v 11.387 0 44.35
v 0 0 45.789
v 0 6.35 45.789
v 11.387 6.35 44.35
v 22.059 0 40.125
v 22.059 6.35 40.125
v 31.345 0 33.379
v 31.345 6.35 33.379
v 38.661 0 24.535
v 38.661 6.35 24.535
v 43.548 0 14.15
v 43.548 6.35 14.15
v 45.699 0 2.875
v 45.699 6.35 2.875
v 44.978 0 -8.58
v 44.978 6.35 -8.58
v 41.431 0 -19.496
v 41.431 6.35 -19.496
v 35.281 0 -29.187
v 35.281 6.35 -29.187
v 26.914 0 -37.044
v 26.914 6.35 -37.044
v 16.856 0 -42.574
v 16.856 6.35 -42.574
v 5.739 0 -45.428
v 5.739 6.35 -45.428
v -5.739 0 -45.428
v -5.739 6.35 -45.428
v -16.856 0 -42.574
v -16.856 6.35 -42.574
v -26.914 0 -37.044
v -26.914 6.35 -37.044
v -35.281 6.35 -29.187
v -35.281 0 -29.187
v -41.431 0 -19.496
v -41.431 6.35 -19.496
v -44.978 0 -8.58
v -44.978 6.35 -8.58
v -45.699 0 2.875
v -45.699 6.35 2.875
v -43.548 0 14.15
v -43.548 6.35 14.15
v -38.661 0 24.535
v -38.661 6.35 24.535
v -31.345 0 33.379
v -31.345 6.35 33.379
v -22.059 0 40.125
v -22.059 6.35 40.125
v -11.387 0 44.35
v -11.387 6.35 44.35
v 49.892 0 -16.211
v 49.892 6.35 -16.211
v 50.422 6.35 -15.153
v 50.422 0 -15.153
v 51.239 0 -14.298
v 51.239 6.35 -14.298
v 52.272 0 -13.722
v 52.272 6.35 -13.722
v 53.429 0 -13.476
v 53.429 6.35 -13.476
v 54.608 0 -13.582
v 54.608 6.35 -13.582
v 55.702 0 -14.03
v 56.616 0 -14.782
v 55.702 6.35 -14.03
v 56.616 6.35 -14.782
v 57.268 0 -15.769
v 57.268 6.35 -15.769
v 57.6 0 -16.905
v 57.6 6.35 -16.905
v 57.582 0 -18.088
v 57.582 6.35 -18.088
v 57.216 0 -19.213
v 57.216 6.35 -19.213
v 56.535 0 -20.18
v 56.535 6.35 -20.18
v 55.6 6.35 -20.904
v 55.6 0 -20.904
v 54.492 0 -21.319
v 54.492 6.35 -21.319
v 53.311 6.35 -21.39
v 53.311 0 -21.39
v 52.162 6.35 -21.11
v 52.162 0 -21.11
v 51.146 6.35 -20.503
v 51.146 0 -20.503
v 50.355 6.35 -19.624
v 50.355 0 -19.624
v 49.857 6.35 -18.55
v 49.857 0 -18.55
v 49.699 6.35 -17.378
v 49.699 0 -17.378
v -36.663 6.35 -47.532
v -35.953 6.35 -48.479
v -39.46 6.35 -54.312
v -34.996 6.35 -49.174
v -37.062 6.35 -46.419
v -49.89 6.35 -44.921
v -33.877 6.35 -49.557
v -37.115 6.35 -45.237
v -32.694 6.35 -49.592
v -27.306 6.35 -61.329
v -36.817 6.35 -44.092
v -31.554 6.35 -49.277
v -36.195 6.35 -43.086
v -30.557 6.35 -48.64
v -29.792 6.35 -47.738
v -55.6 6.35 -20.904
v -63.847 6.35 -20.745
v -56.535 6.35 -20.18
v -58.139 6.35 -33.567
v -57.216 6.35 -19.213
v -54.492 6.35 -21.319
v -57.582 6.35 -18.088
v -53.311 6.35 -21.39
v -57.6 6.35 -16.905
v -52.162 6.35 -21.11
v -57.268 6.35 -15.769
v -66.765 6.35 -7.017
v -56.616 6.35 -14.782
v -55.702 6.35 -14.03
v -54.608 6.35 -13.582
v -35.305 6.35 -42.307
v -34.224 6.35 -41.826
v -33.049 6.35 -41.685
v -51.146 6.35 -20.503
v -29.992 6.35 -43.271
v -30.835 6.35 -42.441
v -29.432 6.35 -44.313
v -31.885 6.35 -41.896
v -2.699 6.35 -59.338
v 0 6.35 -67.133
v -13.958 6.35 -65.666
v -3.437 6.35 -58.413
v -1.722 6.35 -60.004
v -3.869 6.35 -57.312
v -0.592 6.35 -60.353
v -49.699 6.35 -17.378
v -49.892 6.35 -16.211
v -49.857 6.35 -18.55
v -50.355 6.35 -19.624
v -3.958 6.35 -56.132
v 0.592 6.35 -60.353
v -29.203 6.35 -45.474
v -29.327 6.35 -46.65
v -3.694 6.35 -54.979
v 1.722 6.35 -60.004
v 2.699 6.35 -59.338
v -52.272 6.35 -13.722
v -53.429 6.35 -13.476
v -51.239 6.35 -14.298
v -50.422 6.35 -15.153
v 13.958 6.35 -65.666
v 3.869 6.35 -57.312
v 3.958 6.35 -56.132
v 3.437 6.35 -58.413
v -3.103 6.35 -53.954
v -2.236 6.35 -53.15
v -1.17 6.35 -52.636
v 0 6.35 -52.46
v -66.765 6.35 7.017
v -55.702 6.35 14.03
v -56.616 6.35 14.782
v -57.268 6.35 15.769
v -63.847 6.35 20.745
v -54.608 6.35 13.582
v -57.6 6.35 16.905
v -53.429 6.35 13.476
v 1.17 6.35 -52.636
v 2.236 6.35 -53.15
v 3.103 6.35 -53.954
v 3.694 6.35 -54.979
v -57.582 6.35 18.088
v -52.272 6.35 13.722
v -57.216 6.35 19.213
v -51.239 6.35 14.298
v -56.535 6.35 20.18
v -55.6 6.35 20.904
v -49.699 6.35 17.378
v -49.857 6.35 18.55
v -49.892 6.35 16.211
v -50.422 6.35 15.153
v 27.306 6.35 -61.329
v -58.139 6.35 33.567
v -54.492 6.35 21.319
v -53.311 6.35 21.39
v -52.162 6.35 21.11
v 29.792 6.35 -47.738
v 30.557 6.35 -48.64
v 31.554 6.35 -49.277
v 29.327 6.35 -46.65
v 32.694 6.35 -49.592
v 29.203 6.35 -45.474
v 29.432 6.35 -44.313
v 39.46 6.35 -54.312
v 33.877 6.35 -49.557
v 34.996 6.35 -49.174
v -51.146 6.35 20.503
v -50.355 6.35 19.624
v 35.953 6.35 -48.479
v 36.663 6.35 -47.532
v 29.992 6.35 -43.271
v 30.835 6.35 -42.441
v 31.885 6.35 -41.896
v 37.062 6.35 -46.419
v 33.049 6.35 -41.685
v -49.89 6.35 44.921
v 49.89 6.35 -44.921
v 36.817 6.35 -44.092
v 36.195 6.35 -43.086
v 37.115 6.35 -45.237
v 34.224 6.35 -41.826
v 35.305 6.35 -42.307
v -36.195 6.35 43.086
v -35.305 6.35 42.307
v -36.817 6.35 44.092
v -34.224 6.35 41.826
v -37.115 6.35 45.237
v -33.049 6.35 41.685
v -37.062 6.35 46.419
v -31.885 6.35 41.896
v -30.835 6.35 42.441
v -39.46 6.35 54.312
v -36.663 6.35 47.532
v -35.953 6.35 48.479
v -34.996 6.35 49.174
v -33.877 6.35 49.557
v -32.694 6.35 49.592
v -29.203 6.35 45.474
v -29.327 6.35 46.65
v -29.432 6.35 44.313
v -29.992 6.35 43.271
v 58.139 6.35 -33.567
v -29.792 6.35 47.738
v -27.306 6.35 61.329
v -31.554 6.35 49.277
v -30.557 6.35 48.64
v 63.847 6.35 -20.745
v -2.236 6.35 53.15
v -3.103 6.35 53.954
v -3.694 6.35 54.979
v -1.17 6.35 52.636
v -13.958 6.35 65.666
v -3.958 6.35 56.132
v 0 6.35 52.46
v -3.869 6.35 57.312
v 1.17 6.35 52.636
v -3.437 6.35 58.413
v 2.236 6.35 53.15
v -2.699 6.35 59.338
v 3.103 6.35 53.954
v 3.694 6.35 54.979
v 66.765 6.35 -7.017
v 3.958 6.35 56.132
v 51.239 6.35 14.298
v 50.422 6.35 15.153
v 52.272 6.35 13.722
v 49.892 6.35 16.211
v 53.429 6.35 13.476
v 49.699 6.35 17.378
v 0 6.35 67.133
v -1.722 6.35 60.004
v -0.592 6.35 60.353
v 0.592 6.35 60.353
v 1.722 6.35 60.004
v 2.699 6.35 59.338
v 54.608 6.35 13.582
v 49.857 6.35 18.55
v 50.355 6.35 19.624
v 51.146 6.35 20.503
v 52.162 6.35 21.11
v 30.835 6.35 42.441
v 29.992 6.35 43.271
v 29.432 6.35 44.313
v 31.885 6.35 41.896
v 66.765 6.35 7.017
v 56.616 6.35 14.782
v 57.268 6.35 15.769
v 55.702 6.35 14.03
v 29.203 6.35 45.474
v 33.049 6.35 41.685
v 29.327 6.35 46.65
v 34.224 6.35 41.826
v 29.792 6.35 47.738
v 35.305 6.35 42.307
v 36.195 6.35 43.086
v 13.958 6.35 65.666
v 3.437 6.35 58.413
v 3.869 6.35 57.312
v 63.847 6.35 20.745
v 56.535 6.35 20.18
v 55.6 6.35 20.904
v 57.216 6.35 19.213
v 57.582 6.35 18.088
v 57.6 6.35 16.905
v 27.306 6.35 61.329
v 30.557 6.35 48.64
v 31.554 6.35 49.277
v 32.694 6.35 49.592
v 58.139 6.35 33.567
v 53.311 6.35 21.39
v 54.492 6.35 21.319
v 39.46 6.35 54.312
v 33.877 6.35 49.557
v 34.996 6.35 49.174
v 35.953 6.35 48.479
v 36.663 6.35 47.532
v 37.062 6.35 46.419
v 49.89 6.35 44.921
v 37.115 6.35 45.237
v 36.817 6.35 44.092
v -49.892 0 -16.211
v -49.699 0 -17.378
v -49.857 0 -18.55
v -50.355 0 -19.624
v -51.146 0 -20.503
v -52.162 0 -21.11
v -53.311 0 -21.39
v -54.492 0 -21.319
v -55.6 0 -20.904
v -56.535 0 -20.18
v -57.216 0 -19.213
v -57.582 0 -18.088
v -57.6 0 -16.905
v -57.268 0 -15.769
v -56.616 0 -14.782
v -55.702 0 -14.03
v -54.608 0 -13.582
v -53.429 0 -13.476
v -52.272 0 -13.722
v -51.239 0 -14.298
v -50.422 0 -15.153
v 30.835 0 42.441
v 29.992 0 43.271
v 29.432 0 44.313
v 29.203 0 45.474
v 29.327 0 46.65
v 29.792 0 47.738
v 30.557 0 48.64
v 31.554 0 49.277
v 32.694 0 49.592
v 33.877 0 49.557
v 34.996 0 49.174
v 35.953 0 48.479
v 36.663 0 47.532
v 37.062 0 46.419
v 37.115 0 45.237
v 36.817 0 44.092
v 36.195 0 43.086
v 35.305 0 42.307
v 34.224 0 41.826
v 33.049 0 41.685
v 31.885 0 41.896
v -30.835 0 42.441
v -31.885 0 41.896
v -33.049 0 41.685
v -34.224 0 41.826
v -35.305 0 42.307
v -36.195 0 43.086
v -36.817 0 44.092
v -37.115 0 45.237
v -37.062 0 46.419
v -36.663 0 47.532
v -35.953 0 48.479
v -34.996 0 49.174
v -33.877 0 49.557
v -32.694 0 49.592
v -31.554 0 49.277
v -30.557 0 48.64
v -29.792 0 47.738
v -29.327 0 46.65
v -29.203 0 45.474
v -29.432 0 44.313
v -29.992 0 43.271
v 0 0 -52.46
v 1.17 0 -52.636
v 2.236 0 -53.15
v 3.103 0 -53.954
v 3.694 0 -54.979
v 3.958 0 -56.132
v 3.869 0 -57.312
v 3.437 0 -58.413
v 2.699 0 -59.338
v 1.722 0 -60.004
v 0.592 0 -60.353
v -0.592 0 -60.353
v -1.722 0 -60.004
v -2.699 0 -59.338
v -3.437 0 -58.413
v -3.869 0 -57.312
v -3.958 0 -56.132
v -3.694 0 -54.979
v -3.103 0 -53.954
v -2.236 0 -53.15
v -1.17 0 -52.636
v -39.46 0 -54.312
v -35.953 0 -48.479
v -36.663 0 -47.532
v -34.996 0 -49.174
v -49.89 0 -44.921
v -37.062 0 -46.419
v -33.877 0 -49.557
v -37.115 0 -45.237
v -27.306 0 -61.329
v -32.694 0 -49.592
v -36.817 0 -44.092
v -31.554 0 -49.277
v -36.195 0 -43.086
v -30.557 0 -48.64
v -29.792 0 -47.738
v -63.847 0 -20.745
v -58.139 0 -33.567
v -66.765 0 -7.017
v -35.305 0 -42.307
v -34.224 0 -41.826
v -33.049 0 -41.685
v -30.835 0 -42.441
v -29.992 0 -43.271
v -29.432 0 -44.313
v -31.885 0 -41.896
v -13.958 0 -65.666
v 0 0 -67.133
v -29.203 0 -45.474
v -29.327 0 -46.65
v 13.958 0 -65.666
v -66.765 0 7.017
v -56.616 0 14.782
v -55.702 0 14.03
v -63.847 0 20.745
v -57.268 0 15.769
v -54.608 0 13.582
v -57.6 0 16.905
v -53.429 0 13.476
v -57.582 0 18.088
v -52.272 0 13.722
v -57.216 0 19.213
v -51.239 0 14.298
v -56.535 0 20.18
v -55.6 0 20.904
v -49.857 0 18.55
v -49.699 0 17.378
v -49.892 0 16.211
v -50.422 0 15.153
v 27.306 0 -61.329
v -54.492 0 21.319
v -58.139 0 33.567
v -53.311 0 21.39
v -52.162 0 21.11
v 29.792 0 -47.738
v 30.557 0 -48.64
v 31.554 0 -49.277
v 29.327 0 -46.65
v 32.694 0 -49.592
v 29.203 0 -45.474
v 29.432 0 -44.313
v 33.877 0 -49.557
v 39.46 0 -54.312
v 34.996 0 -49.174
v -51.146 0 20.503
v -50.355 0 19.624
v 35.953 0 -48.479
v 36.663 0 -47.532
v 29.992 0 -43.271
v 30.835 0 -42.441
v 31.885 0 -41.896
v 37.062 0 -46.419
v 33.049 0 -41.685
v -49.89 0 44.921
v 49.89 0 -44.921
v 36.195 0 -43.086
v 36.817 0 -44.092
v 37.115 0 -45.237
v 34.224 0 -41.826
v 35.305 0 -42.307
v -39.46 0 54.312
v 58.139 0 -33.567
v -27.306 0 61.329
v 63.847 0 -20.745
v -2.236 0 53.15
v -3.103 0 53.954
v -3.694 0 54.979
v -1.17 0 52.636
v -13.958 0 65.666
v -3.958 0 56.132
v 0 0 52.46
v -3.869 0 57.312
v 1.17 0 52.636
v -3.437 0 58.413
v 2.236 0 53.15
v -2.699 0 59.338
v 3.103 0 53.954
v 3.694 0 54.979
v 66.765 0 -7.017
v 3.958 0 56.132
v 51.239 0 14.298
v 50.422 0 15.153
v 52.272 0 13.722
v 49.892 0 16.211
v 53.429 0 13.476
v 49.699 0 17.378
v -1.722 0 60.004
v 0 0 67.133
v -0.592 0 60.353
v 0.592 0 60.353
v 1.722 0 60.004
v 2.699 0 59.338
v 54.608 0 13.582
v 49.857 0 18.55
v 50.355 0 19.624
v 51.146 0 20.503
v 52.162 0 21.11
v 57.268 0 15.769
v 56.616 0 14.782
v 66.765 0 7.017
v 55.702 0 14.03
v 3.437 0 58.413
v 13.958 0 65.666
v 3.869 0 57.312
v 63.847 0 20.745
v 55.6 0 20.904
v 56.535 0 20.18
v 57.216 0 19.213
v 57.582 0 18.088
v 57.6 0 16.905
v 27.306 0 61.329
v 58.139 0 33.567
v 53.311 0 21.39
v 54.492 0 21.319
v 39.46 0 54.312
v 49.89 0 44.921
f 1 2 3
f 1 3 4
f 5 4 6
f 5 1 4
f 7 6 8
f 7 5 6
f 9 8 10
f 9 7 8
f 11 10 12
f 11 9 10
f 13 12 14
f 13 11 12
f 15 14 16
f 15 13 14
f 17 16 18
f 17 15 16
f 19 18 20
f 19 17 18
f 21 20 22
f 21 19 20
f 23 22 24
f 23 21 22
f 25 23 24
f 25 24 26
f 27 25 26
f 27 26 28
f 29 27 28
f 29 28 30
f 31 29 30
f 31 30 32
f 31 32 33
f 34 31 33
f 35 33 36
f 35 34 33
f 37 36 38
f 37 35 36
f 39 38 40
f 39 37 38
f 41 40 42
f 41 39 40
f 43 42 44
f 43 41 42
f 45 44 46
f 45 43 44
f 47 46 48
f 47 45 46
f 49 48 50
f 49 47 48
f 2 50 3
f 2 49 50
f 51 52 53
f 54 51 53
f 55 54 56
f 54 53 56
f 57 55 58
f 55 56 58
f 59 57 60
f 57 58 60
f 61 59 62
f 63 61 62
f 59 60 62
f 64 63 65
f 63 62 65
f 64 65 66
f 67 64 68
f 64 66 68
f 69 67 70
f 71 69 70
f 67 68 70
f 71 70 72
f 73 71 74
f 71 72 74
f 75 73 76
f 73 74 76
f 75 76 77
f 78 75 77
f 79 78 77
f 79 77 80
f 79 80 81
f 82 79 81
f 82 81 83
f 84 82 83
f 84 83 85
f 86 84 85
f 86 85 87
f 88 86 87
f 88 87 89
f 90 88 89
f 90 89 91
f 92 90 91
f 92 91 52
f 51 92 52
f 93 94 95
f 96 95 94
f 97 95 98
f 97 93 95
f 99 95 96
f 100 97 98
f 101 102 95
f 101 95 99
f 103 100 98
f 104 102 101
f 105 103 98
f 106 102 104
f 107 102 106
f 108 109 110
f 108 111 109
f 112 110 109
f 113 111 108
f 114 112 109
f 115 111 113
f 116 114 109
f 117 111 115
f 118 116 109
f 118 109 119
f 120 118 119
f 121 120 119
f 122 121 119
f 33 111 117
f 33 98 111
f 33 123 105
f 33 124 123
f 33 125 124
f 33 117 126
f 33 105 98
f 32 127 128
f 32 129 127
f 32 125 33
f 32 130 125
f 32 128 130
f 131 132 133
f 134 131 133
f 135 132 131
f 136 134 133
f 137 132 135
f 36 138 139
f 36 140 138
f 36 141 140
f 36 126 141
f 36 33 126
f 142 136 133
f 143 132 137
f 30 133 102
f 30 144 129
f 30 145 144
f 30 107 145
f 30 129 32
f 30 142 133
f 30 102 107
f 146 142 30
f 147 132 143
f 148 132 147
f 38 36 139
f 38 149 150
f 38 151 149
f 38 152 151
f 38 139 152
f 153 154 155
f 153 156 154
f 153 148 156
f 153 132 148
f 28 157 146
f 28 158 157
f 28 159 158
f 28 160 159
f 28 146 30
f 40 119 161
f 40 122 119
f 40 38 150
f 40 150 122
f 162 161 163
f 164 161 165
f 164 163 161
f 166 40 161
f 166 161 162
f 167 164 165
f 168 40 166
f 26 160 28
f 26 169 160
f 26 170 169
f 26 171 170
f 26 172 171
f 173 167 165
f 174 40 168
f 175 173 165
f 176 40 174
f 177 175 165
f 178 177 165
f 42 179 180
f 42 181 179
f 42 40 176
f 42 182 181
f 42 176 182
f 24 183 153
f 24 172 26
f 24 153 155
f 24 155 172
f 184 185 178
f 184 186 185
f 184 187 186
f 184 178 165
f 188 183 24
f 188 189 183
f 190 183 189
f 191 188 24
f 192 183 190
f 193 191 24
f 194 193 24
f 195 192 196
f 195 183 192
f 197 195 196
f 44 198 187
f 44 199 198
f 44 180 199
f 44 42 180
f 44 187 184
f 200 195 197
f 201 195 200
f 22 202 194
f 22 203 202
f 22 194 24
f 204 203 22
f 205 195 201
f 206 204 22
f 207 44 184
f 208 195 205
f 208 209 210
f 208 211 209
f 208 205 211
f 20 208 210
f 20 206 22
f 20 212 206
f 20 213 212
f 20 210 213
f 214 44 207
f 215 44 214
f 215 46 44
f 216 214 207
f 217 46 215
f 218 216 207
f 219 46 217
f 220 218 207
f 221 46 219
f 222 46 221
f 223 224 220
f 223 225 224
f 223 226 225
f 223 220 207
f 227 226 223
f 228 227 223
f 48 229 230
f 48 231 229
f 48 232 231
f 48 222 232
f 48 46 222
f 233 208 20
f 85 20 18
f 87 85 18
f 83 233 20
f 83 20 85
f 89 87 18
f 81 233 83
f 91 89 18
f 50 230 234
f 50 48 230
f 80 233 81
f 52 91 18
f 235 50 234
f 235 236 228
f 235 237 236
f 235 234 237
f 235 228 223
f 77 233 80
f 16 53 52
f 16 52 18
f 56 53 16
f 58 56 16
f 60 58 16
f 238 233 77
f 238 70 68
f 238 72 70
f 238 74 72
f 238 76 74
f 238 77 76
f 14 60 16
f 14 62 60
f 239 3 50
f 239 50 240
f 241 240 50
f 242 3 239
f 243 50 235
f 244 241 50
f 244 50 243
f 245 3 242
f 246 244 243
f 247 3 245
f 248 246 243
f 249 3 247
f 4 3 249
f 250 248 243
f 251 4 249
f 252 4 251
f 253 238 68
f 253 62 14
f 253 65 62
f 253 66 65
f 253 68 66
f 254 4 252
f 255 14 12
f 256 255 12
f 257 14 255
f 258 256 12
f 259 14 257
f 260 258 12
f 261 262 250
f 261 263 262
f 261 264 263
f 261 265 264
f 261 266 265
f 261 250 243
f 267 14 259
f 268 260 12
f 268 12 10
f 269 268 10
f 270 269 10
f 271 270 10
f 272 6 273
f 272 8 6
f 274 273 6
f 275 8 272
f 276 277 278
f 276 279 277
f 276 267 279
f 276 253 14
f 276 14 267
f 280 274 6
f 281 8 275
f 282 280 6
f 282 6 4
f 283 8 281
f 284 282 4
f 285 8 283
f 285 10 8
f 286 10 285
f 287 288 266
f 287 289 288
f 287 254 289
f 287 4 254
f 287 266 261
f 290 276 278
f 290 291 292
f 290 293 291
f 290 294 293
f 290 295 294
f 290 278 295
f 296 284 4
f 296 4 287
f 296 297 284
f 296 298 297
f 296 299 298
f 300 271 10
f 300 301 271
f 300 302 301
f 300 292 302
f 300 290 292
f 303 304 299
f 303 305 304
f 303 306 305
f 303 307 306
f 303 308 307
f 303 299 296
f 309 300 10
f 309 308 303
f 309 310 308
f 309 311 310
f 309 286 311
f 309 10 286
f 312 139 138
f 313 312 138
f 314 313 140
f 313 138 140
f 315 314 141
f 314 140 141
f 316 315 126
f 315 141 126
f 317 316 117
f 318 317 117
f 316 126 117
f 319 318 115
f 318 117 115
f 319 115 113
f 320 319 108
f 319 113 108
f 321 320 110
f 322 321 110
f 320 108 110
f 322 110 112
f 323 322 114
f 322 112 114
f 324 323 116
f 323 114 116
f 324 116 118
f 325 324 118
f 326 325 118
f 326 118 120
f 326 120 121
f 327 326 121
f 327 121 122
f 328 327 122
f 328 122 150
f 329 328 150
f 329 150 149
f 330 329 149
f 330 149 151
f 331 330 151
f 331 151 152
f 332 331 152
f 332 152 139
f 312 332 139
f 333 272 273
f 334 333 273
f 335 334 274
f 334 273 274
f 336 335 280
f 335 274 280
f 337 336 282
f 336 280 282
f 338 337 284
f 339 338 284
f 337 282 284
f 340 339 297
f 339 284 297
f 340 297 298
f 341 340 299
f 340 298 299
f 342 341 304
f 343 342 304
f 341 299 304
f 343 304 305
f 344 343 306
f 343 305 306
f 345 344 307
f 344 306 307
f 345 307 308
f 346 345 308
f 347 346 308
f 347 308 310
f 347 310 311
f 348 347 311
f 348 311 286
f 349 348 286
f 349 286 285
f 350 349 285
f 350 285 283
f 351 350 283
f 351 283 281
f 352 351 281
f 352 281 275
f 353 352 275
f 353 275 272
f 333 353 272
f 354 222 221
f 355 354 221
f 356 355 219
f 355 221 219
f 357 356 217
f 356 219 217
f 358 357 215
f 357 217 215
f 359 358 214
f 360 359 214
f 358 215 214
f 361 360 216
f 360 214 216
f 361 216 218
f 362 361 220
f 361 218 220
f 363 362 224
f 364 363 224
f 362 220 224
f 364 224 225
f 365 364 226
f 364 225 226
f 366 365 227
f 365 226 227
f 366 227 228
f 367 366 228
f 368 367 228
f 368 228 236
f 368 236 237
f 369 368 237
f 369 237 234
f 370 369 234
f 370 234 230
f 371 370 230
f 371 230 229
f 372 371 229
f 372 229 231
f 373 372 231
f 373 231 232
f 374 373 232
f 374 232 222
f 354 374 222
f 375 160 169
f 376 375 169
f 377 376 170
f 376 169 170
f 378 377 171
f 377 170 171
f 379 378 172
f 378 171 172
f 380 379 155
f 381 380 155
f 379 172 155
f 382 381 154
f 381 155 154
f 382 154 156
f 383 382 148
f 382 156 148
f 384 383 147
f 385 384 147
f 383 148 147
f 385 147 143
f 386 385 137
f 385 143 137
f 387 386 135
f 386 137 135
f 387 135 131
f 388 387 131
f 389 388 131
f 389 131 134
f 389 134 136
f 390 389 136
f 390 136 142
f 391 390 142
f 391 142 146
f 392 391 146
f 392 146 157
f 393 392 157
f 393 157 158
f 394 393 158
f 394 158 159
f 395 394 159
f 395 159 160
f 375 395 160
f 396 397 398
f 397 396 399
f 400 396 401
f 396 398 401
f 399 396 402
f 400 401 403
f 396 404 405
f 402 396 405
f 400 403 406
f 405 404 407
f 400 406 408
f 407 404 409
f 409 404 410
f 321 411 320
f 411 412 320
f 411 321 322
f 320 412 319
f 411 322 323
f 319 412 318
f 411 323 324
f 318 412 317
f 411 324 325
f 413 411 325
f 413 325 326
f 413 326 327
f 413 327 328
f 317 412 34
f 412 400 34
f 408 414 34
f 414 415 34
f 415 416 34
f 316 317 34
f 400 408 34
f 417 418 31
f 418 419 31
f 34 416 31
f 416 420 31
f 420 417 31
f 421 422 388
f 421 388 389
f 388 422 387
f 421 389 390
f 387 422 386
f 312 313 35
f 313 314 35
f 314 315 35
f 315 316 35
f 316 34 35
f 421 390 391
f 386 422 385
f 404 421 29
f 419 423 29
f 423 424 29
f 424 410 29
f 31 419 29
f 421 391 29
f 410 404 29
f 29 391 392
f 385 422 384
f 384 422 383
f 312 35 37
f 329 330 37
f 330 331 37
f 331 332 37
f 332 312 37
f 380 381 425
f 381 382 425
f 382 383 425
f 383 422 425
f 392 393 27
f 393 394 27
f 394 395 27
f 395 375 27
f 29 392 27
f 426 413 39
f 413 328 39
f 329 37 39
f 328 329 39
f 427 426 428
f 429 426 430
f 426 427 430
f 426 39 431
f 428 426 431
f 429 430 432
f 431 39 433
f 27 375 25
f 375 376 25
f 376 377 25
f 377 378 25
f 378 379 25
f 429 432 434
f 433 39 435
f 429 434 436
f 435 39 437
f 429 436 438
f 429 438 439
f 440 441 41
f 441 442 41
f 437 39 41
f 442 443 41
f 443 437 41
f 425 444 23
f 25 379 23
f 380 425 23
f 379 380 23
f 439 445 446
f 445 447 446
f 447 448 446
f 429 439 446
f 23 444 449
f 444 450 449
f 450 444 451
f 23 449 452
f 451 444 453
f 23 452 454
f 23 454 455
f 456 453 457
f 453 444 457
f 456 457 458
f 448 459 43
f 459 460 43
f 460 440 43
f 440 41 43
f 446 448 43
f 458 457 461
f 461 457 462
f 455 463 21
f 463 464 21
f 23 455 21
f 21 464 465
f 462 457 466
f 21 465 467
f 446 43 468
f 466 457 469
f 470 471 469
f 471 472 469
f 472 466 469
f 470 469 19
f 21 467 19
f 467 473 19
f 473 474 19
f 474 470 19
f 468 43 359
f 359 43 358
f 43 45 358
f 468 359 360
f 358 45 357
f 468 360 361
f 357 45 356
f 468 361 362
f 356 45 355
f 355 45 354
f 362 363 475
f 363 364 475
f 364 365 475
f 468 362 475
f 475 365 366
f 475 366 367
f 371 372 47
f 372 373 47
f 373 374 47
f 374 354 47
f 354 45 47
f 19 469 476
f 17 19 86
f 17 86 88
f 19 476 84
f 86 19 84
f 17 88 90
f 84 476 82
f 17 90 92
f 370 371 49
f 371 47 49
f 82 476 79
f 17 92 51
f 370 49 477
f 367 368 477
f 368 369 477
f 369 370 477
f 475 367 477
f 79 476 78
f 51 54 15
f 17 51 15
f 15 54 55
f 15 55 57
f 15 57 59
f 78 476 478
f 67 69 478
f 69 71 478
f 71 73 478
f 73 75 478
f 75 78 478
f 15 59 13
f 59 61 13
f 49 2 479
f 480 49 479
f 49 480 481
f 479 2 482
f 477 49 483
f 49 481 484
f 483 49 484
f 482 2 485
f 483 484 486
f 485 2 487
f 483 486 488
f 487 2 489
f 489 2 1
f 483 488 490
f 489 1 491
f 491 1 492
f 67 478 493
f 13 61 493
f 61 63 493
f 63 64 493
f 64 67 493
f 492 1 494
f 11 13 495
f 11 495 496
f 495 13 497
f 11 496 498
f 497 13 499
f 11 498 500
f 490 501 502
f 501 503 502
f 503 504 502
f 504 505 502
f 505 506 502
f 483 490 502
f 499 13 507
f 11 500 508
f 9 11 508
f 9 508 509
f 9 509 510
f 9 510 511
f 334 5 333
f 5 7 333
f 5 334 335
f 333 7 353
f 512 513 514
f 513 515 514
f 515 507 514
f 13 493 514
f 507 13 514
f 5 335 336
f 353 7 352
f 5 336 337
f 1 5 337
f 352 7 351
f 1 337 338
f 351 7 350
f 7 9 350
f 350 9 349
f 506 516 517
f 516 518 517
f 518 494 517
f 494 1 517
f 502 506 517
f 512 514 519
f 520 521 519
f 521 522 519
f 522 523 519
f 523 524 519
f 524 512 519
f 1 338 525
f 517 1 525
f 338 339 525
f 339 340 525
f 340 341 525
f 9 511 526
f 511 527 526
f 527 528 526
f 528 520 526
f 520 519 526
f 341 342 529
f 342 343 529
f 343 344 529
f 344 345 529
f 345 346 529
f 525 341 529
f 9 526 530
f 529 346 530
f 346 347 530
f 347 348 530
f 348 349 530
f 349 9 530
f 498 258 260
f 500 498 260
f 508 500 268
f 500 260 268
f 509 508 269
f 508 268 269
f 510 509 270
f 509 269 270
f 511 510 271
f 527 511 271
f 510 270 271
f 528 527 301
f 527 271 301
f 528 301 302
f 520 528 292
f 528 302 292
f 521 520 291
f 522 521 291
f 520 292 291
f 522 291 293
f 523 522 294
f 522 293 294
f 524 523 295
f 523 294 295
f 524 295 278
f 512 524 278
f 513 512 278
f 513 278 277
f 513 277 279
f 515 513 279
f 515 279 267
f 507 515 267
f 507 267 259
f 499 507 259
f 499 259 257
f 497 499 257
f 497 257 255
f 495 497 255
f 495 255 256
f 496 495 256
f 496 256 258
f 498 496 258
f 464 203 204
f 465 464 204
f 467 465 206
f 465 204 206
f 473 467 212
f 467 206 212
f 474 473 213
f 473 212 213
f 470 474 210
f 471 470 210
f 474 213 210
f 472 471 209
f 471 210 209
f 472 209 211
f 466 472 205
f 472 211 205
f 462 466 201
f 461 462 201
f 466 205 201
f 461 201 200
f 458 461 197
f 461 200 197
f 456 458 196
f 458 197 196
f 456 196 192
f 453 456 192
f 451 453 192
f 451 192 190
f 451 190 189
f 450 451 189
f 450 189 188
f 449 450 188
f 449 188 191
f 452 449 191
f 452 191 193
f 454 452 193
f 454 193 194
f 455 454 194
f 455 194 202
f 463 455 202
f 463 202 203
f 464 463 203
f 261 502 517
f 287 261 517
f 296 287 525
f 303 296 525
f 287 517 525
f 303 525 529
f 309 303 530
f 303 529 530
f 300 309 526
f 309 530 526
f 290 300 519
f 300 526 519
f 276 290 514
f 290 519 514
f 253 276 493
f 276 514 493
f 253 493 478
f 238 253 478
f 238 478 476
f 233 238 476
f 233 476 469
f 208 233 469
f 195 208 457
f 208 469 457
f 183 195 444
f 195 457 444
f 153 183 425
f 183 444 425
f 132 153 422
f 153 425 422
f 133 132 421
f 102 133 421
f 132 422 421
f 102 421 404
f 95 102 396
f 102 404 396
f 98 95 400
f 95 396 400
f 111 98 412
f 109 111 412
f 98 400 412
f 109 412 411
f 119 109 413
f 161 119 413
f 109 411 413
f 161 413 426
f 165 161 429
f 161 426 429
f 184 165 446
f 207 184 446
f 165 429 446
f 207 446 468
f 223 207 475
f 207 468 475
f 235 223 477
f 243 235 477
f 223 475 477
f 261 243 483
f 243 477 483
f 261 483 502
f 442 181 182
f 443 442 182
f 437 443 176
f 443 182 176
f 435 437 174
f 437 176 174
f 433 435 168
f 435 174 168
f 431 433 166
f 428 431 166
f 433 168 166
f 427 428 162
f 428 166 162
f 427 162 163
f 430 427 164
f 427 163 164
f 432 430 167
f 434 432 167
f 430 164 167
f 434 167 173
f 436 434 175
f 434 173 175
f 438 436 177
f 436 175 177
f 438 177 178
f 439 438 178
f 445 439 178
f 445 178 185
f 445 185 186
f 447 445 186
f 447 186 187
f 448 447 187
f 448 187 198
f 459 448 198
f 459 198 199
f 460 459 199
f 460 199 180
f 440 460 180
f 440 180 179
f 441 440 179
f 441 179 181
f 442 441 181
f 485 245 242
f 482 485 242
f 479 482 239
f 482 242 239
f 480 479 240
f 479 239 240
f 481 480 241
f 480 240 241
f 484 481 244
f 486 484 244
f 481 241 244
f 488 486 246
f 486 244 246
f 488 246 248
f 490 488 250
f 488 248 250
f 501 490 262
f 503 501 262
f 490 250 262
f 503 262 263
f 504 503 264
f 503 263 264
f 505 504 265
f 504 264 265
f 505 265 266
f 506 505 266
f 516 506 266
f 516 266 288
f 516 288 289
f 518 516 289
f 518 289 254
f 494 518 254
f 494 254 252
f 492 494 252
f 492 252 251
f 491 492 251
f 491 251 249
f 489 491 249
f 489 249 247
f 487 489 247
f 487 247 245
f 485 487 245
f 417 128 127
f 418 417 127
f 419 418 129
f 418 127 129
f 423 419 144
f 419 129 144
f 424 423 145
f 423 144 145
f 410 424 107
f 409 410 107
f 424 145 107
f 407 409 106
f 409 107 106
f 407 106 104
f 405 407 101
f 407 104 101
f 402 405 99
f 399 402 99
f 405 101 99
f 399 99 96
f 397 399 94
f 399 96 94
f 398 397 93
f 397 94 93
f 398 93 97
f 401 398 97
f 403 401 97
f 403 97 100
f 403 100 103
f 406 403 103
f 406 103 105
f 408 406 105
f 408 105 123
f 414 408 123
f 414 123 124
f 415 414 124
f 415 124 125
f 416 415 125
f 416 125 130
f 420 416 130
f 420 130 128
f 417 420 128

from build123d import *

# Parameters (mm, degrees)
SKETCH1_R           = 67.133194764
SKETCH1_R_2         = 45.789019651
BOSS_EXTRUDE1_DEPTH = 6.35
CUT_EXTRUDE1_REACH  = 97.153
SKETCH2_R           = 3.96875
CIRPATTERN1_COUNT   = 10


with BuildPart() as part:
    # Sketch1 → Boss-Extrude1 (new body)
    with BuildSketch(Plane(origin=(0, 0, 0), x_dir=(1, 0, 0), z_dir=(0, 1, 0))):
        with Locations(Location((0, 0, 0), (0, 0, 270))):
            Circle(SKETCH1_R)
        with Locations(Location((0, 0, 0), (0, 0, 270))):
            Circle(SKETCH1_R_2, mode=Mode.SUBTRACT)
    extrude(amount=BOSS_EXTRUDE1_DEPTH)

    # Sketch2 → Cut-Extrude1 (cut, up to next)
    with BuildSketch(Plane(origin=(0, 6.35, 0), x_dir=(1, 0, 0), z_dir=(0, 1, 0)), mode=Mode.PRIVATE) as cut_extrude1_sk1:
        with Locations(Location((0, 56.428647919, 0), (0, 0, 270))):
            Circle(SKETCH2_R)
    cut_extrude1_tool1 = extrude(cut_extrude1_sk1.sketch, amount=-CUT_EXTRUDE1_REACH, mode=Mode.PRIVATE) & part.part
    cut_extrude1 = cut_extrude1_tool1.solids().sort_by_distance((0, 6.35, -56.428648))[0]
    add(cut_extrude1, mode=Mode.SUBTRACT)

    # CirPattern1: Cut-Extrude1 ×10 about axis
    cirpattern1_axis = Axis((0, 0, 0), (0, 1, 0))
    for i in range(1, CIRPATTERN1_COUNT):
        add(cut_extrude1.rotate(cirpattern1_axis, i * 360 / CIRPATTERN1_COUNT), mode=Mode.SUBTRACT)


solid = part.part
